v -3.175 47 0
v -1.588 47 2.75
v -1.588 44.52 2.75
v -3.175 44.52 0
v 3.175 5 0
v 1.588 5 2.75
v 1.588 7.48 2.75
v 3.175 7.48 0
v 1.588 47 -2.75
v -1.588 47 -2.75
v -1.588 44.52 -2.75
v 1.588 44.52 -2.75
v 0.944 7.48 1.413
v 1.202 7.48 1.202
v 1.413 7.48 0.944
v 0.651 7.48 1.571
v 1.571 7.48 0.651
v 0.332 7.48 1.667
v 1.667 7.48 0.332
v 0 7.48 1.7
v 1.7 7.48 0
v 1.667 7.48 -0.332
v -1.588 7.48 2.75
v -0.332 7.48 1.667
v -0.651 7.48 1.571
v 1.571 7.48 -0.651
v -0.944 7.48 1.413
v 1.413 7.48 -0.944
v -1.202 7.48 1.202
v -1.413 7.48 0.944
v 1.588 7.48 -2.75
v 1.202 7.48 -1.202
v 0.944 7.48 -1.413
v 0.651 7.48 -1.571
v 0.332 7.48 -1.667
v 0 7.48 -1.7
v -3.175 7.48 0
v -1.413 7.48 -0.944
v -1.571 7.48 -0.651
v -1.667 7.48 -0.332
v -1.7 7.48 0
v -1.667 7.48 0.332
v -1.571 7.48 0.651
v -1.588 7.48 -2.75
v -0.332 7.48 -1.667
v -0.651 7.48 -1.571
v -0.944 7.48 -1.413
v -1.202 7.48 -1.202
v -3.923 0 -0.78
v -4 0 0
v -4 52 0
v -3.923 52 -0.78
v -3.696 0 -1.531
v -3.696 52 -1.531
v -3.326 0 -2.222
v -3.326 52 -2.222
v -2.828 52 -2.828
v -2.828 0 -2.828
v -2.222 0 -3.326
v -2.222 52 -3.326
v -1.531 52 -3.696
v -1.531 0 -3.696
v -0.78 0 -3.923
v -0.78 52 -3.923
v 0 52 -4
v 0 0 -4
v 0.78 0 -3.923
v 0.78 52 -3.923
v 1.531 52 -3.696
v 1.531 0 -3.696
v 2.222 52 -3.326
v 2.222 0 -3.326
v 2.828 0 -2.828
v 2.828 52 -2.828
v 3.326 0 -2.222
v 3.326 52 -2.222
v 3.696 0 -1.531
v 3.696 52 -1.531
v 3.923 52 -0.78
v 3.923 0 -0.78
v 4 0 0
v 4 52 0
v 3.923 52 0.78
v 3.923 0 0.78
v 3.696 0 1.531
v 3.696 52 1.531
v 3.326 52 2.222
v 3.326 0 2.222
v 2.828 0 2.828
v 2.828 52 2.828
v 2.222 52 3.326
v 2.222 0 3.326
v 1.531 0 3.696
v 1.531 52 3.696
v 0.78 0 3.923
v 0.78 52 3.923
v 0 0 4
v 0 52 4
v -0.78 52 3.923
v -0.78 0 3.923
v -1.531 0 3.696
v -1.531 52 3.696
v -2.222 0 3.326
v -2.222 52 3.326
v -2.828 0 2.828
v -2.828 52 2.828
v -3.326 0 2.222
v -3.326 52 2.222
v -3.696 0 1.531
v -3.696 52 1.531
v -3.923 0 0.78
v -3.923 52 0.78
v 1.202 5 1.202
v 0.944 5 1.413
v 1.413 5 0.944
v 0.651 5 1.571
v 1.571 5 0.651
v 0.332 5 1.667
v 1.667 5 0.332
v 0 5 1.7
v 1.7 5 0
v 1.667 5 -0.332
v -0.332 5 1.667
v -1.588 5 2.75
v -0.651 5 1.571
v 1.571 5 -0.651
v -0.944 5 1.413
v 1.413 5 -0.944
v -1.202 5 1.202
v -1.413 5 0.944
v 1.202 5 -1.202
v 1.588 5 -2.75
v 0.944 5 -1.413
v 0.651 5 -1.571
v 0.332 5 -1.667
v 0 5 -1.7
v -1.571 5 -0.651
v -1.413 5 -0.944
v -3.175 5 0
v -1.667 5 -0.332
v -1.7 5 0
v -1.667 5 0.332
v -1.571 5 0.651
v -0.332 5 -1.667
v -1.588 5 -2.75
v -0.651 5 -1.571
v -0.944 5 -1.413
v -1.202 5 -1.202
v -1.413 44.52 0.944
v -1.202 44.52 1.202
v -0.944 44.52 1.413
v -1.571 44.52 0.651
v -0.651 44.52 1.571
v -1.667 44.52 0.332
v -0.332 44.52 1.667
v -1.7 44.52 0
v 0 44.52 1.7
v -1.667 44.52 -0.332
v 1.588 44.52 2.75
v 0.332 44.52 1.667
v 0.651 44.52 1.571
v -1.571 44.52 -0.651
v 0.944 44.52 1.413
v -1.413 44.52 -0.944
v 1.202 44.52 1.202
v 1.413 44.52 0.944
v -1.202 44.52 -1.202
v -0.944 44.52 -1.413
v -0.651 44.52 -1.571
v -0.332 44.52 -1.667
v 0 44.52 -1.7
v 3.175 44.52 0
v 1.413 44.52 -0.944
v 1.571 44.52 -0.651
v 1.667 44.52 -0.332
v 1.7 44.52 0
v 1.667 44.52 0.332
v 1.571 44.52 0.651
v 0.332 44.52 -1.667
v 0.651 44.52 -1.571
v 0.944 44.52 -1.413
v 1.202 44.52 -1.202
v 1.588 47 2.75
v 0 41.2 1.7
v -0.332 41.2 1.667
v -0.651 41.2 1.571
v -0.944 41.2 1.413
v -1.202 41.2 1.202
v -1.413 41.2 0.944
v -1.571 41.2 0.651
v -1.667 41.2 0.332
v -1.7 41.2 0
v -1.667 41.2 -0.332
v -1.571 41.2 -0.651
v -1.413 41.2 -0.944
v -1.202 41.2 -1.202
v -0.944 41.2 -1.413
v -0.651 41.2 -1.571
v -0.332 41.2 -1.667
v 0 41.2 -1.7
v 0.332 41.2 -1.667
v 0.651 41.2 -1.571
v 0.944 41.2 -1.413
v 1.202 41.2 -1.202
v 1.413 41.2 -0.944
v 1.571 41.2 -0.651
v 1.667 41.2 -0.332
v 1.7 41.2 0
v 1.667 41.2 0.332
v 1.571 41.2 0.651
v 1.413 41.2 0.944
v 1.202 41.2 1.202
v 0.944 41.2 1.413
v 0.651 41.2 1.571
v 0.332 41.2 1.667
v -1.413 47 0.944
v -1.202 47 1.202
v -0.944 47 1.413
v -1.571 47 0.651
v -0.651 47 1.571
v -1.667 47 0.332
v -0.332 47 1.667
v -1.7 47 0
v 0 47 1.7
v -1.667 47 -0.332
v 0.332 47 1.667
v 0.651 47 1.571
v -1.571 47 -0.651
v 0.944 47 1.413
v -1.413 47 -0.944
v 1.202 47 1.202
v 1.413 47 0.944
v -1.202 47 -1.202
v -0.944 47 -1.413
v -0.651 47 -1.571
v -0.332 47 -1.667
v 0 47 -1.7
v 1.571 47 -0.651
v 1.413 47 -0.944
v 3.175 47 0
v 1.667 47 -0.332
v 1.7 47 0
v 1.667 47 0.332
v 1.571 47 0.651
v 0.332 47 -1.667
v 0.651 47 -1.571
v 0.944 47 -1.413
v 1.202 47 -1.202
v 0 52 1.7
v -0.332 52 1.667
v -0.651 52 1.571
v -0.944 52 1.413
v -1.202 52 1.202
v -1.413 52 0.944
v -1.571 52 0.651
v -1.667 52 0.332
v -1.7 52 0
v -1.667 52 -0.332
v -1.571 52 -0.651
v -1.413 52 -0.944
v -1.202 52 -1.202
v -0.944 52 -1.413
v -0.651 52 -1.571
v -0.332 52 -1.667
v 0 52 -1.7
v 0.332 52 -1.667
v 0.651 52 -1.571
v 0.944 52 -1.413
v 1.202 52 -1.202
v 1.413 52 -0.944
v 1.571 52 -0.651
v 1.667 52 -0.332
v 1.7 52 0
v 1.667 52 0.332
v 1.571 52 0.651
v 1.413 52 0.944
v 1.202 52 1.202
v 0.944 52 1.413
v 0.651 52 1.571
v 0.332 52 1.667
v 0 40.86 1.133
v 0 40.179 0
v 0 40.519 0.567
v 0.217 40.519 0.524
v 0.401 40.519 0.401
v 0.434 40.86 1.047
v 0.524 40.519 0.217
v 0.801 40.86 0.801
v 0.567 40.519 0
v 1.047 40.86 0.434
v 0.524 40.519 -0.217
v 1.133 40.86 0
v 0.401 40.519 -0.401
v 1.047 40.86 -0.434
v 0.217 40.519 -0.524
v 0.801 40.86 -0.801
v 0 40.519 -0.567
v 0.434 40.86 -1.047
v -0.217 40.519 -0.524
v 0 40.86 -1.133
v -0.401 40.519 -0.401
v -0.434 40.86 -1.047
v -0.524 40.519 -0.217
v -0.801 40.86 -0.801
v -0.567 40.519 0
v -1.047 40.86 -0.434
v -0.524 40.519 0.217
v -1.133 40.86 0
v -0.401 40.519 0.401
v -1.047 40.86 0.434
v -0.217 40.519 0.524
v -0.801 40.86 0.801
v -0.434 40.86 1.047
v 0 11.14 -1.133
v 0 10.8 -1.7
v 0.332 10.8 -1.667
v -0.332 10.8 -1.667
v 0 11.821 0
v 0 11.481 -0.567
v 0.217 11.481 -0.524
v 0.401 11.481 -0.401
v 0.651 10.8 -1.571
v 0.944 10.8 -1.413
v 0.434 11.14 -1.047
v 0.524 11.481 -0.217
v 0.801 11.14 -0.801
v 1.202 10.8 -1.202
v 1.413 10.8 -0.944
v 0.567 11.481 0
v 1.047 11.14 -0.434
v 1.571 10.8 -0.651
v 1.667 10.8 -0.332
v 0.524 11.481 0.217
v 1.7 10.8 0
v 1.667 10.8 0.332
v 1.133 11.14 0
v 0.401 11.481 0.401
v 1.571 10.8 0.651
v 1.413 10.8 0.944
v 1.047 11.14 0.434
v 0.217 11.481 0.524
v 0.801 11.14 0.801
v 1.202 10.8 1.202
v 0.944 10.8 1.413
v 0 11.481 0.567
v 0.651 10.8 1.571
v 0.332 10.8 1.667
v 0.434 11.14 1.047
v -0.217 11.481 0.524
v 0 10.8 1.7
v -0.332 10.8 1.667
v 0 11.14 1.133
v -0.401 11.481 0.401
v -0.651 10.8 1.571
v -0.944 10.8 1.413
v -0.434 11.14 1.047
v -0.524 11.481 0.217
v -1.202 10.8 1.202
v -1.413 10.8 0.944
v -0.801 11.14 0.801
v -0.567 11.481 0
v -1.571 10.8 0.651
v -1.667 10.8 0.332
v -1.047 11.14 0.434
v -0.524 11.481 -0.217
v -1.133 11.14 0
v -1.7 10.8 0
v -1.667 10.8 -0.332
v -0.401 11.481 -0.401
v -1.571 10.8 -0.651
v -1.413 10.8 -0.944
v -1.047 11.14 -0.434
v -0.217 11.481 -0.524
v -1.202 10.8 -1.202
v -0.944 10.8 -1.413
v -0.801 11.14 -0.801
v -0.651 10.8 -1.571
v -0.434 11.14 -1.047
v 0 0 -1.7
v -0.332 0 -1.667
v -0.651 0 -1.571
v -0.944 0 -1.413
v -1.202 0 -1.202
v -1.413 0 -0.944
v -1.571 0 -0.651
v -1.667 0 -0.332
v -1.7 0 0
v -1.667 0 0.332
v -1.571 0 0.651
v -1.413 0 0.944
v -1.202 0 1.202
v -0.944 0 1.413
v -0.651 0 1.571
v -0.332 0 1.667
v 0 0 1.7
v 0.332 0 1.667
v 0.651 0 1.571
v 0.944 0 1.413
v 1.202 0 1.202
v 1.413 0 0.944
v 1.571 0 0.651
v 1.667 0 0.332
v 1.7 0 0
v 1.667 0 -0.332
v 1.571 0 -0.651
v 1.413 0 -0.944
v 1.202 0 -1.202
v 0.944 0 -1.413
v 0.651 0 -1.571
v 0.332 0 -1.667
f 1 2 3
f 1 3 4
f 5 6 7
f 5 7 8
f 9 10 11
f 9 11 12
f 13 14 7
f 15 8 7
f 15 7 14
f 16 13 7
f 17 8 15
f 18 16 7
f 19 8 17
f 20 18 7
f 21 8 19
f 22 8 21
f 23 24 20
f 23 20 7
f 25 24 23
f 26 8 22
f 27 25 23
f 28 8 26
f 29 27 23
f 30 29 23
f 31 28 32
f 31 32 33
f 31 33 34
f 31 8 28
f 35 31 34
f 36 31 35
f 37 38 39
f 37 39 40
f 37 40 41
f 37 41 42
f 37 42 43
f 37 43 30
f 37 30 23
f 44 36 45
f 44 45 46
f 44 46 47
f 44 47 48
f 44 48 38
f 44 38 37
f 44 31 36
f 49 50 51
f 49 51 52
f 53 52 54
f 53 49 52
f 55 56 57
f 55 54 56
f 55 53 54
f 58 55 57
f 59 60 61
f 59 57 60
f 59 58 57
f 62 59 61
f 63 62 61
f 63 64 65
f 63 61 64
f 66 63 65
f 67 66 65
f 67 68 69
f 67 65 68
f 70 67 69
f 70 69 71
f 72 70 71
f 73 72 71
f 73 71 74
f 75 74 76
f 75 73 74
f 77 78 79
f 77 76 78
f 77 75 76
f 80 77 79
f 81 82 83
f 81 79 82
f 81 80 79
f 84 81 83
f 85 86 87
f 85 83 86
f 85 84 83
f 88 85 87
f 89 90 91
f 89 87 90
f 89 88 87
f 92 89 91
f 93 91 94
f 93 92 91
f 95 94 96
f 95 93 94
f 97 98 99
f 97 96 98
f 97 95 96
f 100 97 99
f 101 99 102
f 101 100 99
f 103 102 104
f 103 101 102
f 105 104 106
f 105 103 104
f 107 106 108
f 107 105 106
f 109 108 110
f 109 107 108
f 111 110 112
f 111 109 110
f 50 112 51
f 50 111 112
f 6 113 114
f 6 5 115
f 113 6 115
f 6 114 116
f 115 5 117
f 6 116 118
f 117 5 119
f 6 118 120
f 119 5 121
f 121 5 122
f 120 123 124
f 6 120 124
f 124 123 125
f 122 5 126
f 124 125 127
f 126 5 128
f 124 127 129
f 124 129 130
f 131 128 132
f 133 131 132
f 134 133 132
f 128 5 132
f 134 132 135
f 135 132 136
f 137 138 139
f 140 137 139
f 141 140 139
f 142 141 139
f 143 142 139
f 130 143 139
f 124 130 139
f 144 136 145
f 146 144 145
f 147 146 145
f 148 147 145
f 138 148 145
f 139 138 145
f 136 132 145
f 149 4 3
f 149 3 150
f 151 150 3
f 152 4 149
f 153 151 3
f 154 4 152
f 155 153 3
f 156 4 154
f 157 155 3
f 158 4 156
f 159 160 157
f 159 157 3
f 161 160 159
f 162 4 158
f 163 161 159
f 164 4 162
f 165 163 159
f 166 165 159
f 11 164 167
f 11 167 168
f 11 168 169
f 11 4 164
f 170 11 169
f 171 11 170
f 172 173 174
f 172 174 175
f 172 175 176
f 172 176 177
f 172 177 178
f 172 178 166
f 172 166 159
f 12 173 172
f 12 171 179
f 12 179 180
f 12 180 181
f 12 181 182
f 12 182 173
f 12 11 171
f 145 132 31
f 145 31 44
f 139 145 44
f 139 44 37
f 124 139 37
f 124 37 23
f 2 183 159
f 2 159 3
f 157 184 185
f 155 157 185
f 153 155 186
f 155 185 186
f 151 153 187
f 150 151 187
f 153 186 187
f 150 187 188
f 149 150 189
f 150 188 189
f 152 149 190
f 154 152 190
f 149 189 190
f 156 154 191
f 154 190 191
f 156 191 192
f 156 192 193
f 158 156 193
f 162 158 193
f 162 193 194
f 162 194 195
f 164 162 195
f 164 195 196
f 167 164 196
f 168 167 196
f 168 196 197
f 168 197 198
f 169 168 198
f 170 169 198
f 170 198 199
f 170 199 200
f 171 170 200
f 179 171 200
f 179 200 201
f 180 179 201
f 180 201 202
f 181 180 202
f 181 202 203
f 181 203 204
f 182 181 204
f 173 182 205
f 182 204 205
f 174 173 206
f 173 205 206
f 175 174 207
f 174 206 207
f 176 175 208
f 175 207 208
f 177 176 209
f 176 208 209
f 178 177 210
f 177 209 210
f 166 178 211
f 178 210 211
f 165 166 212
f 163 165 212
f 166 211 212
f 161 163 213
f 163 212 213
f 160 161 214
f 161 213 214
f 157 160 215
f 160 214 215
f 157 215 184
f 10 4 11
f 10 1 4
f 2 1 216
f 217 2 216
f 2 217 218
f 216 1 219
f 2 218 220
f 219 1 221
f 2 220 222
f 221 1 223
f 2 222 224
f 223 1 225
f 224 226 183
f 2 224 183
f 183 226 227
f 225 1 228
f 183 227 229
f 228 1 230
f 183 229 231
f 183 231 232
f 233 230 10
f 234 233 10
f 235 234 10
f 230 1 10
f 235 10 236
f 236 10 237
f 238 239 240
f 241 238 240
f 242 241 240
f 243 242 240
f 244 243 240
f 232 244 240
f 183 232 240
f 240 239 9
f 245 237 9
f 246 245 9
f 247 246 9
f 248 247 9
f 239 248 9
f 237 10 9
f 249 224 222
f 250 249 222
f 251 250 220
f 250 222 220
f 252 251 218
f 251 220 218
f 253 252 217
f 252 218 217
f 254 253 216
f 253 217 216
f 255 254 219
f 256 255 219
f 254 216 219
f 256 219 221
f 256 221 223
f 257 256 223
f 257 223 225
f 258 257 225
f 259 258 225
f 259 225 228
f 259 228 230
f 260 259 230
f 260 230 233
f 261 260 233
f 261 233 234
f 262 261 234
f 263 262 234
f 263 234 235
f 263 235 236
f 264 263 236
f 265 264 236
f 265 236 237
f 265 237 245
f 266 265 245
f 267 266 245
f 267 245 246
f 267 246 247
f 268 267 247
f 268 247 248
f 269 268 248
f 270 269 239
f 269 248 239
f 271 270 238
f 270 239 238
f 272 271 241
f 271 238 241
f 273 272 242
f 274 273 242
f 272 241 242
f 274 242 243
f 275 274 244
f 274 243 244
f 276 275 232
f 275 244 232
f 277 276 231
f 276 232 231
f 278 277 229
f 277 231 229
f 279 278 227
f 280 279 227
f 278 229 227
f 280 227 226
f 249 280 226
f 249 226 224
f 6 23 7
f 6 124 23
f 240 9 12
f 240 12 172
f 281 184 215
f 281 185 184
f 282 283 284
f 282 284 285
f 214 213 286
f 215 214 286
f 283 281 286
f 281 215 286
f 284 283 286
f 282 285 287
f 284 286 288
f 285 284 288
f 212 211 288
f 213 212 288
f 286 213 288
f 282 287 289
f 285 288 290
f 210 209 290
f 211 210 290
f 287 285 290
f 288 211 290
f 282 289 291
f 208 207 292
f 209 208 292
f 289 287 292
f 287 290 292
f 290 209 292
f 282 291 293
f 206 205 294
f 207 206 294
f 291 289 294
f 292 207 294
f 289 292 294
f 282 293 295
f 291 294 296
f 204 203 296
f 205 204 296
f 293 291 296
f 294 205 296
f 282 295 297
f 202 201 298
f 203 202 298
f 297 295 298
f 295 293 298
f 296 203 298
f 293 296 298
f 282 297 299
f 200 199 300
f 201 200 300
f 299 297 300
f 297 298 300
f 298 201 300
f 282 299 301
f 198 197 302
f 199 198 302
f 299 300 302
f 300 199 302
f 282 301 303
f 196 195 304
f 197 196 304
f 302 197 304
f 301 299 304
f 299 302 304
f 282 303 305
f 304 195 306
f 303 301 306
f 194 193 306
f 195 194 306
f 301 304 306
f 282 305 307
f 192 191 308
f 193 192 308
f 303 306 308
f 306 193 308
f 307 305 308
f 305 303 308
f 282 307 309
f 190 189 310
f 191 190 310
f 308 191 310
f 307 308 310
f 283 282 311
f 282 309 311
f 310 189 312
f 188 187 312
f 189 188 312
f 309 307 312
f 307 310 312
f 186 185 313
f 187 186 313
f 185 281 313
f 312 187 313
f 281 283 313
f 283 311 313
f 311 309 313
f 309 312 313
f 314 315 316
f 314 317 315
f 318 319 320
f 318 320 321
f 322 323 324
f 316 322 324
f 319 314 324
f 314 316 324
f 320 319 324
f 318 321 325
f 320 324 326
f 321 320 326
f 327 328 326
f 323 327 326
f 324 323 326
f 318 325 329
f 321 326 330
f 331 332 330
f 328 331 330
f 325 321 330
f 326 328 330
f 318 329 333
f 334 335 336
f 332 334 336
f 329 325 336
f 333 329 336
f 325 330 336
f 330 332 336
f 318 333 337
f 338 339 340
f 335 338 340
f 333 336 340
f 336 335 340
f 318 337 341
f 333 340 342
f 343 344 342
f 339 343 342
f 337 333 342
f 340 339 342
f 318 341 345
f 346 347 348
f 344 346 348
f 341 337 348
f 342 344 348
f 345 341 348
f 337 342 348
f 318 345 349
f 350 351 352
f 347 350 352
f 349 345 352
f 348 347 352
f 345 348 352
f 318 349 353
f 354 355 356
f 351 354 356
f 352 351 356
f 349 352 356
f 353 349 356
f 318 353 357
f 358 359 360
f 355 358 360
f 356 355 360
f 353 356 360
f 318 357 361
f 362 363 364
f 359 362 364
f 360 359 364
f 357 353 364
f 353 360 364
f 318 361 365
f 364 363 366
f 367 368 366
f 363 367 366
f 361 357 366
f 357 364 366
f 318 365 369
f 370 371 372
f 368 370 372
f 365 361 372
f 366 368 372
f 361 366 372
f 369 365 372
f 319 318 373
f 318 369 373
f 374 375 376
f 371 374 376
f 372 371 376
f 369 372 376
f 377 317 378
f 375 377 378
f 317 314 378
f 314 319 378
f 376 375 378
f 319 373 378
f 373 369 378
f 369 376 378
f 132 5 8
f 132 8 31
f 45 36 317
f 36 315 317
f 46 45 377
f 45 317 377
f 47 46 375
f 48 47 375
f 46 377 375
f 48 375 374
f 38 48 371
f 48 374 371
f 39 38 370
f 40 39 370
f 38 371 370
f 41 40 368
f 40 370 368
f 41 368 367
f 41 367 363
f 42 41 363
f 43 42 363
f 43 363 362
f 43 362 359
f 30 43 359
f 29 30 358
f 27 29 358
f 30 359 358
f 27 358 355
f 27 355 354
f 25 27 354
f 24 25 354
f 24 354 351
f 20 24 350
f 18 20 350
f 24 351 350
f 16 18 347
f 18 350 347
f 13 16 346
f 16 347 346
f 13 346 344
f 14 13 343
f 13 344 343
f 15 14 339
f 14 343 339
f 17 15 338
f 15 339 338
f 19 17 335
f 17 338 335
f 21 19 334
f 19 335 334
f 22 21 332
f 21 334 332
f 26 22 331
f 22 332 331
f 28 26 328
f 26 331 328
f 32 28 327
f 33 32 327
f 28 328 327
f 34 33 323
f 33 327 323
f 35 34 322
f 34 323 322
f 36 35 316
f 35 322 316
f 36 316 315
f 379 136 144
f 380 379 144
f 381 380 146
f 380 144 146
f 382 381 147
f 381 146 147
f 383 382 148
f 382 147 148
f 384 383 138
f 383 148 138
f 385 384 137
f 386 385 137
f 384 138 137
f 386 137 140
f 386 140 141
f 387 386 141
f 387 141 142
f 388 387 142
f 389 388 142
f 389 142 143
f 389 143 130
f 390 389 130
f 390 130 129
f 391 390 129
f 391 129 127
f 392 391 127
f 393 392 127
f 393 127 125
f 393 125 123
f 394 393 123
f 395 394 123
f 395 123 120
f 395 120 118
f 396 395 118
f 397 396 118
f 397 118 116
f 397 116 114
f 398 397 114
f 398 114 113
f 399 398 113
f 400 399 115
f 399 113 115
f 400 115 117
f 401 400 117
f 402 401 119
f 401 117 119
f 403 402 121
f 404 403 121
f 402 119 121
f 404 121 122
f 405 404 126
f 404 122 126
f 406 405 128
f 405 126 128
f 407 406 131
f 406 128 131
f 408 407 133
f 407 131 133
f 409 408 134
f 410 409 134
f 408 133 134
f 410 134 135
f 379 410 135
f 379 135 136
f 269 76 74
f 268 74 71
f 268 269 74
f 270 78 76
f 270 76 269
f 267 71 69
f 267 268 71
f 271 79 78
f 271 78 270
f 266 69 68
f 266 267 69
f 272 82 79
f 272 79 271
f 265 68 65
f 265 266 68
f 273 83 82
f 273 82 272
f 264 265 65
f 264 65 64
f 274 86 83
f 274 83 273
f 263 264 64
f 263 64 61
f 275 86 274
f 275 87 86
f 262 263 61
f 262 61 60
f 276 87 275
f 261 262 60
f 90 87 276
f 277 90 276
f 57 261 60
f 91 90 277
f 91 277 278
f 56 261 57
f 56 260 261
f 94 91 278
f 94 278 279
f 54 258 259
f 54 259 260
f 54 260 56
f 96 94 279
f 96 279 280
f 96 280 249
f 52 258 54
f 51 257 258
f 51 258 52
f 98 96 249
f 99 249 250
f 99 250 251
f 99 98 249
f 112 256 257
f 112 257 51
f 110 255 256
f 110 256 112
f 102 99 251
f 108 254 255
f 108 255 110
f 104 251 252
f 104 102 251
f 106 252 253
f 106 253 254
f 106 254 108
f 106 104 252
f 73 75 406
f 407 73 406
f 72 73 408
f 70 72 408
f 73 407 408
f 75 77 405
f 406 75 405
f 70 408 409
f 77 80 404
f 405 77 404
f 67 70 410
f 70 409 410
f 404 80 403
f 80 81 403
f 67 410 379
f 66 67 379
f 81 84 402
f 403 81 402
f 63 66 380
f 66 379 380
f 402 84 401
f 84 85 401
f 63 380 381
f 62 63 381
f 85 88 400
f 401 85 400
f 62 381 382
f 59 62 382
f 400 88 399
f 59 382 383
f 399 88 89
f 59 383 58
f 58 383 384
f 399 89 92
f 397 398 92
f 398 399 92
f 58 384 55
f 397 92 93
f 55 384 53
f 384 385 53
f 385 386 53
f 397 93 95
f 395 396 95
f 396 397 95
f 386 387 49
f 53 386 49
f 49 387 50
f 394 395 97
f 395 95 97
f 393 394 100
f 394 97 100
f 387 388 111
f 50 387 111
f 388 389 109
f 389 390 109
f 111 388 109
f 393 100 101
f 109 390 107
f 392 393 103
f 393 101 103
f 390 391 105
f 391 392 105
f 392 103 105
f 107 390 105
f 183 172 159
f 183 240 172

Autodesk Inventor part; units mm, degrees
ref_plane "YZ Plane" through (0, 0, 0) normal (1, 0, 0) x (0, 1, 0)
ref_plane "XZ Plane" through (0, 0, 0) normal (0, 1, 0) x (-1, 0, 0)
ref_plane "XY Plane" through (0, 0, 0) normal (0, 0, 1) x (1, 0, 0)
sketch "Sketch1" plane through (0, 0, 0) normal (0, 1, 0) x (-1, 0, 0)
  circle A0 centre (0, 0) radius 4
  dimension "d0" = 8
extrude "Extrusion1" add sketch "Sketch1" along normal blind 52
sketch "Sketch2" plane through (0, 52, 0) normal (0, 1, 0) x (1, 0, 0)
  point P0 (0, 0)
  point P1 (0, 0)
sketch "Sketch3" plane through (0, 0, 0) normal (0, -1, 0) x (1, 0, 0)
  point P0 (0, 0)
  point P1 (0, 0)
hole "Hole1" at (0, 52, 0) direction (0, -1, 0) diameter 3.4 depth 10.8 tip angle 118 clearance for "Socket Head Cap Screw ISO 4762" size "M3" standard "ISO"
hole "Hole2" at (0, 0, 0) direction (0, 1, 0) diameter 3.4 depth 10.8 tip angle 118 clearance for "Socket Head Cap Screw ISO 4762" size "M3" standard "ISO"
ref_plane "Work Plane2" through (0, 47, 0) normal (0, 1, 0) x (1, 0, 0)
ref_plane "Work Plane3" through (0, 26, 0) normal (0, 1, 0) x (1, 0, 0)
sketch "Sketch5" plane through (0, 47, 0) normal (0, 1, 0) x (1, 0, 0)
  circle A0 centre (0, 0) radius 2.75 construction
  line L0 (1.5877, 2.75) -> (3.1754, 0)
  line L1 (3.1754, 0) -> (1.5877, -2.75)
  line L2 (1.5877, -2.75) -> (-1.5877, -2.75)
  line L3 (-1.5877, -2.75) -> (-3.1754, 0)
  line L4 (-3.1754, 0) -> (-1.5877, 2.75)
  line L5 (-1.5877, 2.75) -> (1.5877, 2.75)
  point P0 (0, 2.75)
  dimension "d24" = 5.5
extrude "Extrusion3" cut sketch "Sketch5" against normal blind 2.48
mirror "Mirror2" about plane through (0, 26, 0) normal (0, 1, 0) of "Extrusion3"
properties part number "rod  for print"
